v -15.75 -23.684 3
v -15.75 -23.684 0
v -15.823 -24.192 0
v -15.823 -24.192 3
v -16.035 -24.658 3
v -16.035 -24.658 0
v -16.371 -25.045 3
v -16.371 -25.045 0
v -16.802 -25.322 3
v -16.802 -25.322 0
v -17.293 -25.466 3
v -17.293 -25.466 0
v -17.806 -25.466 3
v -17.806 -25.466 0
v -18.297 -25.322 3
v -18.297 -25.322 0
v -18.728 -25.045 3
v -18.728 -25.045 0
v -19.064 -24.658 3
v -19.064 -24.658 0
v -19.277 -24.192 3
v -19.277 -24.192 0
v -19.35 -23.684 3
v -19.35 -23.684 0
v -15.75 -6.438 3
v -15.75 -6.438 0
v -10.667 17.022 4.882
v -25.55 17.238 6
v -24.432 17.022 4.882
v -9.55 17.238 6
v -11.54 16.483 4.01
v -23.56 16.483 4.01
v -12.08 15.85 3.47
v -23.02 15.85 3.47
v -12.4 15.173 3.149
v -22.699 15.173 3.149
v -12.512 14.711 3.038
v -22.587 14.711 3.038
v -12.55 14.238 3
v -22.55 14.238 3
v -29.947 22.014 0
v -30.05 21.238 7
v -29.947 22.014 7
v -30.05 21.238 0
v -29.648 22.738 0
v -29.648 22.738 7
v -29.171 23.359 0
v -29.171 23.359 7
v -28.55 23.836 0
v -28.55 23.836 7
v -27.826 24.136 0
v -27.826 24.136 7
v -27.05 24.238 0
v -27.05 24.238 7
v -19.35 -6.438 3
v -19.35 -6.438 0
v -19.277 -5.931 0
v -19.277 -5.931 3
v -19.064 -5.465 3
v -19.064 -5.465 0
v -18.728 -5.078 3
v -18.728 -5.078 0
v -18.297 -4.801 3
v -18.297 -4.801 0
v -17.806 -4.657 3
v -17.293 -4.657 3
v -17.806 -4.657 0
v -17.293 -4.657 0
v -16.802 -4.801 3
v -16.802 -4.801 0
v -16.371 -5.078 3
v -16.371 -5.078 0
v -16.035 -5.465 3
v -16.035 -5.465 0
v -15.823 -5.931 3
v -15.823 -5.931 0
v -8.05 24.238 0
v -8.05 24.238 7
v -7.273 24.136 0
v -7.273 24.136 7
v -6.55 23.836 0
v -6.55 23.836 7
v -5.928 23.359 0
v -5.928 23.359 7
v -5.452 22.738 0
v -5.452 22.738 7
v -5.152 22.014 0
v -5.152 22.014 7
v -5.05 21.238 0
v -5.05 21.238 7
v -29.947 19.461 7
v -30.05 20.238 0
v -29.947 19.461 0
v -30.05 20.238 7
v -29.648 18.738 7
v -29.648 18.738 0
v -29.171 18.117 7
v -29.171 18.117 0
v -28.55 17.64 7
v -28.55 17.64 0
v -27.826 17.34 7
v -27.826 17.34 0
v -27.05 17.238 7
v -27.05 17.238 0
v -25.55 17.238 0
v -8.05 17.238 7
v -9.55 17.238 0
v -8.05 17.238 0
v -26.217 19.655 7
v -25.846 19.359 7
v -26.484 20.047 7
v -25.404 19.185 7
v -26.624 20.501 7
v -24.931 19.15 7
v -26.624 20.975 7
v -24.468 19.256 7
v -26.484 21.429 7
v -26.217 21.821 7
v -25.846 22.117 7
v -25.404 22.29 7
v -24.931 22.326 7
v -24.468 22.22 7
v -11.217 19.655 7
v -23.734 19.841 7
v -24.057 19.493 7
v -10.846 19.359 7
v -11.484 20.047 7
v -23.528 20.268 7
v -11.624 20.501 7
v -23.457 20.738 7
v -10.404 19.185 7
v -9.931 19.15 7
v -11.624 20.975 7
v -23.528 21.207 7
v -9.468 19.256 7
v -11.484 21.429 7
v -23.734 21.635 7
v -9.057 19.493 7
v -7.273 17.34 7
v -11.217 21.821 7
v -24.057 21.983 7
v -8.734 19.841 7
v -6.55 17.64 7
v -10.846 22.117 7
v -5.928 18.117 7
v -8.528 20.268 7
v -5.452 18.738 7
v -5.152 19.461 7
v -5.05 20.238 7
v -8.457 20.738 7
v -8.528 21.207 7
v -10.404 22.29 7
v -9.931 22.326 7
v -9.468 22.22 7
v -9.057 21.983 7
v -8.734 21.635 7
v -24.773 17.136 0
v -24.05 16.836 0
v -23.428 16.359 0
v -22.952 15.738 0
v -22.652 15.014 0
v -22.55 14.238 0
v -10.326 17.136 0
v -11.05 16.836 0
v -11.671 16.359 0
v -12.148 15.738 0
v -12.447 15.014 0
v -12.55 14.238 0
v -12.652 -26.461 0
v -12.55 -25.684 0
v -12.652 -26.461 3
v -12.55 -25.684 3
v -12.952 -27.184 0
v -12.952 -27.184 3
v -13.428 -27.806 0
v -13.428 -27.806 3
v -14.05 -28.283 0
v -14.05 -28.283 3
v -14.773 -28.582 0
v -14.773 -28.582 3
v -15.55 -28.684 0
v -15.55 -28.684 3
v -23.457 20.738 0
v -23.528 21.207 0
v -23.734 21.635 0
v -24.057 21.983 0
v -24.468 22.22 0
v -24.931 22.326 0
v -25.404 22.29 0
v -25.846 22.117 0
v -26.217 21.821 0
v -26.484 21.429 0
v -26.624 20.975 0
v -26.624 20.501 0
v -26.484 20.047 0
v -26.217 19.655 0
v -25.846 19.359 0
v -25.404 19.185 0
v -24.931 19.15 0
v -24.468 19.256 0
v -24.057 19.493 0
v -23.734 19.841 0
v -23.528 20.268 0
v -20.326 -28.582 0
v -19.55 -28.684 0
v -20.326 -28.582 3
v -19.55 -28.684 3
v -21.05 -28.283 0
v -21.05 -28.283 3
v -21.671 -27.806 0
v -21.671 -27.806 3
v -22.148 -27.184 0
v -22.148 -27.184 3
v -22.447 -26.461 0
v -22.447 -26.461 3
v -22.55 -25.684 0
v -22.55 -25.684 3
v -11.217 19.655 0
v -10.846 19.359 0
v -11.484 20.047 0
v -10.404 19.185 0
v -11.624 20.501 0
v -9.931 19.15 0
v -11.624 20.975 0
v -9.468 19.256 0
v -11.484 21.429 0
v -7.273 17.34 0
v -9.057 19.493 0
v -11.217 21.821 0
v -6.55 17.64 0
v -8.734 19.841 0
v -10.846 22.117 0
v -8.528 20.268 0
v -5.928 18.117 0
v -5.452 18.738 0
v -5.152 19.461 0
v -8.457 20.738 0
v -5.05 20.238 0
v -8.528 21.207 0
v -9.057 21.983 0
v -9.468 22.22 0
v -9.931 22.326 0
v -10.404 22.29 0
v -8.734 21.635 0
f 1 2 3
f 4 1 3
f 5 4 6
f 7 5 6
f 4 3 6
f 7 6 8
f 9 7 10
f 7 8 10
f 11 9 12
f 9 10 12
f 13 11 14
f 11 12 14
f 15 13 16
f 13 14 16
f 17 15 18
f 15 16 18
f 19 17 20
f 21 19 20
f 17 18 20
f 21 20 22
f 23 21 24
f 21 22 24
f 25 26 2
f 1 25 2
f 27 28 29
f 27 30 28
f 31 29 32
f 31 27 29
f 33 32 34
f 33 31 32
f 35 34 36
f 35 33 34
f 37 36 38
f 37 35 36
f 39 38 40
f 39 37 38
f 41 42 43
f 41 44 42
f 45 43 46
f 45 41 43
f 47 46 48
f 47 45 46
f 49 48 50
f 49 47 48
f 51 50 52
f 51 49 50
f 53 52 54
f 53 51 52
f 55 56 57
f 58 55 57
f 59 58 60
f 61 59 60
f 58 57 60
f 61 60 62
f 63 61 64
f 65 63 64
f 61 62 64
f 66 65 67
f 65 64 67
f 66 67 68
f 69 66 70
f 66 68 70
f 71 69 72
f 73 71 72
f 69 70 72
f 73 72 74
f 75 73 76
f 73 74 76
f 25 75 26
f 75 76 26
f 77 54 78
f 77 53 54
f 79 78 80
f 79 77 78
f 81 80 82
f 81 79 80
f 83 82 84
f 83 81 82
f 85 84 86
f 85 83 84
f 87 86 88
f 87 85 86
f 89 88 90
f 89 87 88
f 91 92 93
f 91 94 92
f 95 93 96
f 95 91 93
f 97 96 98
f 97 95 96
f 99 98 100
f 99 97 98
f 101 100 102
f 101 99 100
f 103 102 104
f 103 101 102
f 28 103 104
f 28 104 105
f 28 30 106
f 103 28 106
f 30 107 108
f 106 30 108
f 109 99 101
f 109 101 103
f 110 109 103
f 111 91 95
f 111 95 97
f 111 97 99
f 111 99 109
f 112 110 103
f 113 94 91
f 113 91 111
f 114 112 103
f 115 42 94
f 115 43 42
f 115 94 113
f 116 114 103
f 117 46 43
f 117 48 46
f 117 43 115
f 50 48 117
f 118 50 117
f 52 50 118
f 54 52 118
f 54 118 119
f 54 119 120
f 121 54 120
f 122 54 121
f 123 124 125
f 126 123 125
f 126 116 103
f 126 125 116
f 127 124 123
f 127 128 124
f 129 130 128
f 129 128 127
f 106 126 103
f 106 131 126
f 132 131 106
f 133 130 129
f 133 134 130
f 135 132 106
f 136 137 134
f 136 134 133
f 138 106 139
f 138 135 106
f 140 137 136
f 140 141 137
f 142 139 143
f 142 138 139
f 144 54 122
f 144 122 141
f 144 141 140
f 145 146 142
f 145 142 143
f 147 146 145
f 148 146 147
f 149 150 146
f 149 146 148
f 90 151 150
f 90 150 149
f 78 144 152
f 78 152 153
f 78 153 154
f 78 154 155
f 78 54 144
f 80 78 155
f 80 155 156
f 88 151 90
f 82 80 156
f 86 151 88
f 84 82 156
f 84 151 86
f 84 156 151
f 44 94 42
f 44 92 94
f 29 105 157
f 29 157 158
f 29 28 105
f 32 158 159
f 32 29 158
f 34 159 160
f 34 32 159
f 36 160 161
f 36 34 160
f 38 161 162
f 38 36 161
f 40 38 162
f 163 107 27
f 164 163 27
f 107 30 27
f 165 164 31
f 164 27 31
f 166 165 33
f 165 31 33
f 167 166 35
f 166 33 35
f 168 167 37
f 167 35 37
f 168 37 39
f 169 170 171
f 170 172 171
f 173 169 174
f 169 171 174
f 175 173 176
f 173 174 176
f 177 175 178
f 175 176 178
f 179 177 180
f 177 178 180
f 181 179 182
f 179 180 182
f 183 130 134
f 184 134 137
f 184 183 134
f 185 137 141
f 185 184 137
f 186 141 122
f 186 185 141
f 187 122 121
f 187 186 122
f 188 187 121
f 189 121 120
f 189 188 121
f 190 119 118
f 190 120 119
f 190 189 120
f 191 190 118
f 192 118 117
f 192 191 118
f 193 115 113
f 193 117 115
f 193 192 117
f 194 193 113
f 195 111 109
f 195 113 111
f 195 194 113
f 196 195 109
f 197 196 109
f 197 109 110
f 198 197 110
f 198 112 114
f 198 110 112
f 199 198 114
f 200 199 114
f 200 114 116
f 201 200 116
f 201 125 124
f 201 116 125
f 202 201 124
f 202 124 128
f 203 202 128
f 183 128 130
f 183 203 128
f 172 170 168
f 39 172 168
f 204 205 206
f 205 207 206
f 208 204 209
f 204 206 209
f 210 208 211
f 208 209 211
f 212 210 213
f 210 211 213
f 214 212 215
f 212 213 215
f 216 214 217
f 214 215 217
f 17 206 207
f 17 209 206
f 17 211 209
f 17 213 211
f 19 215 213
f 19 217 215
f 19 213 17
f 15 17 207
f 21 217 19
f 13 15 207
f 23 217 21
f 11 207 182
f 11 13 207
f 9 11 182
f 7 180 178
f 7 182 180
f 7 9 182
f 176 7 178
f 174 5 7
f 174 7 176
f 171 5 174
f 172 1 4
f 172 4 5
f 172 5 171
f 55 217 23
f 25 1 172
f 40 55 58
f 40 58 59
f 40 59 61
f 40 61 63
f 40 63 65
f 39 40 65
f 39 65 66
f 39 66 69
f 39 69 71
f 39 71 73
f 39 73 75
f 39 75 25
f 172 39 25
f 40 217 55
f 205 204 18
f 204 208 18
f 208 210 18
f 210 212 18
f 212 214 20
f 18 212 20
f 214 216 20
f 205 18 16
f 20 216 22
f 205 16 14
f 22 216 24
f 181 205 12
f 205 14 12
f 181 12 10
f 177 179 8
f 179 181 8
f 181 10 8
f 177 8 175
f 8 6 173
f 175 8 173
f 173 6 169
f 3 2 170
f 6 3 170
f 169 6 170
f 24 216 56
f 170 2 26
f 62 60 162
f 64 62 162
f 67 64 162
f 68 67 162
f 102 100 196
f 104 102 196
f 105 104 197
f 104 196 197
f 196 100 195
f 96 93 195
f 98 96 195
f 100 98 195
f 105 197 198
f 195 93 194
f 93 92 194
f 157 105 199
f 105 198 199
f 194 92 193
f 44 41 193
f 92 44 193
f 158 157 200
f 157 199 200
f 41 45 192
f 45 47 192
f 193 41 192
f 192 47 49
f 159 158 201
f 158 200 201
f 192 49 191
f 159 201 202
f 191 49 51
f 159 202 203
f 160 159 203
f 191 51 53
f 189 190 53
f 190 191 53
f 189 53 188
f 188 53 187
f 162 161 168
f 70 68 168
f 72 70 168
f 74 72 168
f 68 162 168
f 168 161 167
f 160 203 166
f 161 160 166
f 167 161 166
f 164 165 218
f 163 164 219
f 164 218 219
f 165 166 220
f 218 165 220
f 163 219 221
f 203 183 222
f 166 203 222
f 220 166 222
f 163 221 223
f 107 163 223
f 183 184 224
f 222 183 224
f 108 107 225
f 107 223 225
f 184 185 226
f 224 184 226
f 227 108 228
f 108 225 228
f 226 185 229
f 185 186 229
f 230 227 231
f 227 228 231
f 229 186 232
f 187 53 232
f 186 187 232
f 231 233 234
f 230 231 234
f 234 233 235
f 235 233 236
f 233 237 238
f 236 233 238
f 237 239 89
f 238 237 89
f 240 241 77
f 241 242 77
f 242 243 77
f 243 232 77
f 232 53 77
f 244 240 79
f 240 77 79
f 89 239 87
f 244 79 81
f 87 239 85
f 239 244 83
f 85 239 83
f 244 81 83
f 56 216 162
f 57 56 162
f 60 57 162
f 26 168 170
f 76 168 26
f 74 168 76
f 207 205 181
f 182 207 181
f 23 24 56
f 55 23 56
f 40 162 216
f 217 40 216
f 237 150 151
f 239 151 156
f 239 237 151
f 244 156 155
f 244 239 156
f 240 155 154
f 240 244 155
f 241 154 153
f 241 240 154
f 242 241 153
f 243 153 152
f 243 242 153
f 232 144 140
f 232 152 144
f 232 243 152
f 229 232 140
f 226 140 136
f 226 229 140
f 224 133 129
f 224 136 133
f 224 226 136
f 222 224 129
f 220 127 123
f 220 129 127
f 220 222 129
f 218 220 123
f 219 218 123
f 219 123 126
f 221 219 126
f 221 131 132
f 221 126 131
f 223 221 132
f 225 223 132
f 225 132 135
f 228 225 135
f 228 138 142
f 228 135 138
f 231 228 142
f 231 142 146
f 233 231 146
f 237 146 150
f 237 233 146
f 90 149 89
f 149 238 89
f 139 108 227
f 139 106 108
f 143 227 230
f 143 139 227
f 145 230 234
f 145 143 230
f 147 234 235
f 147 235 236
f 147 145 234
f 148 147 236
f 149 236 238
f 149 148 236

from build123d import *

# Parameters (mm, degrees)
BOSS_EXTRUDE1_DEPTH = 3
SKETCH3_W           = 25
SKETCH3_H           = 7
BOSS_EXTRUDE2_DEPTH = 4
SKETCH2_R           = 1.592288308
CUT_EXTRUDE1_DEPTH  = 10
FILLET1_R           = 3


with BuildPart() as part:
    # Sketch1 → Boss-Extrude1 (new body)
    with BuildSketch(Plane.XY):
        Polygon((-12.549665985, 17.237823834), (-5.049665985, 17.237823834), (-5.049665985, 24.237823834), (-30.049665985, 24.237823834), (-30.049665985, 17.237823834), (-22.549665985, 17.237823834), (-22.549665985, -28.68448974), (-12.549665985, -28.68448974), align=None)
        with BuildLine():
            Line((-19.349665985, -23.68448974), (-19.349665985, -6.438362401))
            ThreePointArc((-19.349665985, -6.438362401), (-17.549665985, -4.638362401), (-15.749665985, -6.438362401))
            Line((-15.749665985, -6.438362401), (-15.749665985, -23.68448974))
            ThreePointArc((-15.749665985, -23.68448974), (-17.549665985, -25.48448974), (-19.349665985, -23.68448974))
        make_face(mode=Mode.SUBTRACT)
    extrude(amount=BOSS_EXTRUDE1_DEPTH)

    # Sketch3 → Boss-Extrude2 (add)
    with BuildSketch(Plane.XY.offset(3)):
        with Locations((-17.549665985, 20.737823834)):
            Rectangle(SKETCH3_W, SKETCH3_H)
    extrude(amount=BOSS_EXTRUDE2_DEPTH)

    # Sketch2 → Cut-Extrude1 (cut)
    with BuildSketch(Plane.XY):
        with Locations((-25.049665985, 20.737823834)):
            Circle(SKETCH2_R)
        with Locations((-10.049665985, 20.737823834)):
            Circle(SKETCH2_R)
    extrude(amount=CUT_EXTRUDE1_DEPTH, mode=Mode.SUBTRACT)

    # Fillet1
    fillet1_edges = [part.edges().sort_by_distance(p)[0] for p in [
        (-5.049665985, 17.237823834, 3.5),
        (-12.549665985, 17.237823834, 1.5),
        (-12.549665985, -28.68448974, 1.5),
        (-22.549665985, -28.68448974, 1.5),
        (-22.549665985, 17.237823834, 1.5),
        (-30.049665985, 17.237823834, 3.5),
        (-30.049665985, 24.237823834, 3.5),
        (-5.049665985, 24.237823834, 3.5),
        (-17.549665985, 17.237823834, 3),
    ]]
    fillet(fillet1_edges, radius=FILLET1_R)


solid = part.part
